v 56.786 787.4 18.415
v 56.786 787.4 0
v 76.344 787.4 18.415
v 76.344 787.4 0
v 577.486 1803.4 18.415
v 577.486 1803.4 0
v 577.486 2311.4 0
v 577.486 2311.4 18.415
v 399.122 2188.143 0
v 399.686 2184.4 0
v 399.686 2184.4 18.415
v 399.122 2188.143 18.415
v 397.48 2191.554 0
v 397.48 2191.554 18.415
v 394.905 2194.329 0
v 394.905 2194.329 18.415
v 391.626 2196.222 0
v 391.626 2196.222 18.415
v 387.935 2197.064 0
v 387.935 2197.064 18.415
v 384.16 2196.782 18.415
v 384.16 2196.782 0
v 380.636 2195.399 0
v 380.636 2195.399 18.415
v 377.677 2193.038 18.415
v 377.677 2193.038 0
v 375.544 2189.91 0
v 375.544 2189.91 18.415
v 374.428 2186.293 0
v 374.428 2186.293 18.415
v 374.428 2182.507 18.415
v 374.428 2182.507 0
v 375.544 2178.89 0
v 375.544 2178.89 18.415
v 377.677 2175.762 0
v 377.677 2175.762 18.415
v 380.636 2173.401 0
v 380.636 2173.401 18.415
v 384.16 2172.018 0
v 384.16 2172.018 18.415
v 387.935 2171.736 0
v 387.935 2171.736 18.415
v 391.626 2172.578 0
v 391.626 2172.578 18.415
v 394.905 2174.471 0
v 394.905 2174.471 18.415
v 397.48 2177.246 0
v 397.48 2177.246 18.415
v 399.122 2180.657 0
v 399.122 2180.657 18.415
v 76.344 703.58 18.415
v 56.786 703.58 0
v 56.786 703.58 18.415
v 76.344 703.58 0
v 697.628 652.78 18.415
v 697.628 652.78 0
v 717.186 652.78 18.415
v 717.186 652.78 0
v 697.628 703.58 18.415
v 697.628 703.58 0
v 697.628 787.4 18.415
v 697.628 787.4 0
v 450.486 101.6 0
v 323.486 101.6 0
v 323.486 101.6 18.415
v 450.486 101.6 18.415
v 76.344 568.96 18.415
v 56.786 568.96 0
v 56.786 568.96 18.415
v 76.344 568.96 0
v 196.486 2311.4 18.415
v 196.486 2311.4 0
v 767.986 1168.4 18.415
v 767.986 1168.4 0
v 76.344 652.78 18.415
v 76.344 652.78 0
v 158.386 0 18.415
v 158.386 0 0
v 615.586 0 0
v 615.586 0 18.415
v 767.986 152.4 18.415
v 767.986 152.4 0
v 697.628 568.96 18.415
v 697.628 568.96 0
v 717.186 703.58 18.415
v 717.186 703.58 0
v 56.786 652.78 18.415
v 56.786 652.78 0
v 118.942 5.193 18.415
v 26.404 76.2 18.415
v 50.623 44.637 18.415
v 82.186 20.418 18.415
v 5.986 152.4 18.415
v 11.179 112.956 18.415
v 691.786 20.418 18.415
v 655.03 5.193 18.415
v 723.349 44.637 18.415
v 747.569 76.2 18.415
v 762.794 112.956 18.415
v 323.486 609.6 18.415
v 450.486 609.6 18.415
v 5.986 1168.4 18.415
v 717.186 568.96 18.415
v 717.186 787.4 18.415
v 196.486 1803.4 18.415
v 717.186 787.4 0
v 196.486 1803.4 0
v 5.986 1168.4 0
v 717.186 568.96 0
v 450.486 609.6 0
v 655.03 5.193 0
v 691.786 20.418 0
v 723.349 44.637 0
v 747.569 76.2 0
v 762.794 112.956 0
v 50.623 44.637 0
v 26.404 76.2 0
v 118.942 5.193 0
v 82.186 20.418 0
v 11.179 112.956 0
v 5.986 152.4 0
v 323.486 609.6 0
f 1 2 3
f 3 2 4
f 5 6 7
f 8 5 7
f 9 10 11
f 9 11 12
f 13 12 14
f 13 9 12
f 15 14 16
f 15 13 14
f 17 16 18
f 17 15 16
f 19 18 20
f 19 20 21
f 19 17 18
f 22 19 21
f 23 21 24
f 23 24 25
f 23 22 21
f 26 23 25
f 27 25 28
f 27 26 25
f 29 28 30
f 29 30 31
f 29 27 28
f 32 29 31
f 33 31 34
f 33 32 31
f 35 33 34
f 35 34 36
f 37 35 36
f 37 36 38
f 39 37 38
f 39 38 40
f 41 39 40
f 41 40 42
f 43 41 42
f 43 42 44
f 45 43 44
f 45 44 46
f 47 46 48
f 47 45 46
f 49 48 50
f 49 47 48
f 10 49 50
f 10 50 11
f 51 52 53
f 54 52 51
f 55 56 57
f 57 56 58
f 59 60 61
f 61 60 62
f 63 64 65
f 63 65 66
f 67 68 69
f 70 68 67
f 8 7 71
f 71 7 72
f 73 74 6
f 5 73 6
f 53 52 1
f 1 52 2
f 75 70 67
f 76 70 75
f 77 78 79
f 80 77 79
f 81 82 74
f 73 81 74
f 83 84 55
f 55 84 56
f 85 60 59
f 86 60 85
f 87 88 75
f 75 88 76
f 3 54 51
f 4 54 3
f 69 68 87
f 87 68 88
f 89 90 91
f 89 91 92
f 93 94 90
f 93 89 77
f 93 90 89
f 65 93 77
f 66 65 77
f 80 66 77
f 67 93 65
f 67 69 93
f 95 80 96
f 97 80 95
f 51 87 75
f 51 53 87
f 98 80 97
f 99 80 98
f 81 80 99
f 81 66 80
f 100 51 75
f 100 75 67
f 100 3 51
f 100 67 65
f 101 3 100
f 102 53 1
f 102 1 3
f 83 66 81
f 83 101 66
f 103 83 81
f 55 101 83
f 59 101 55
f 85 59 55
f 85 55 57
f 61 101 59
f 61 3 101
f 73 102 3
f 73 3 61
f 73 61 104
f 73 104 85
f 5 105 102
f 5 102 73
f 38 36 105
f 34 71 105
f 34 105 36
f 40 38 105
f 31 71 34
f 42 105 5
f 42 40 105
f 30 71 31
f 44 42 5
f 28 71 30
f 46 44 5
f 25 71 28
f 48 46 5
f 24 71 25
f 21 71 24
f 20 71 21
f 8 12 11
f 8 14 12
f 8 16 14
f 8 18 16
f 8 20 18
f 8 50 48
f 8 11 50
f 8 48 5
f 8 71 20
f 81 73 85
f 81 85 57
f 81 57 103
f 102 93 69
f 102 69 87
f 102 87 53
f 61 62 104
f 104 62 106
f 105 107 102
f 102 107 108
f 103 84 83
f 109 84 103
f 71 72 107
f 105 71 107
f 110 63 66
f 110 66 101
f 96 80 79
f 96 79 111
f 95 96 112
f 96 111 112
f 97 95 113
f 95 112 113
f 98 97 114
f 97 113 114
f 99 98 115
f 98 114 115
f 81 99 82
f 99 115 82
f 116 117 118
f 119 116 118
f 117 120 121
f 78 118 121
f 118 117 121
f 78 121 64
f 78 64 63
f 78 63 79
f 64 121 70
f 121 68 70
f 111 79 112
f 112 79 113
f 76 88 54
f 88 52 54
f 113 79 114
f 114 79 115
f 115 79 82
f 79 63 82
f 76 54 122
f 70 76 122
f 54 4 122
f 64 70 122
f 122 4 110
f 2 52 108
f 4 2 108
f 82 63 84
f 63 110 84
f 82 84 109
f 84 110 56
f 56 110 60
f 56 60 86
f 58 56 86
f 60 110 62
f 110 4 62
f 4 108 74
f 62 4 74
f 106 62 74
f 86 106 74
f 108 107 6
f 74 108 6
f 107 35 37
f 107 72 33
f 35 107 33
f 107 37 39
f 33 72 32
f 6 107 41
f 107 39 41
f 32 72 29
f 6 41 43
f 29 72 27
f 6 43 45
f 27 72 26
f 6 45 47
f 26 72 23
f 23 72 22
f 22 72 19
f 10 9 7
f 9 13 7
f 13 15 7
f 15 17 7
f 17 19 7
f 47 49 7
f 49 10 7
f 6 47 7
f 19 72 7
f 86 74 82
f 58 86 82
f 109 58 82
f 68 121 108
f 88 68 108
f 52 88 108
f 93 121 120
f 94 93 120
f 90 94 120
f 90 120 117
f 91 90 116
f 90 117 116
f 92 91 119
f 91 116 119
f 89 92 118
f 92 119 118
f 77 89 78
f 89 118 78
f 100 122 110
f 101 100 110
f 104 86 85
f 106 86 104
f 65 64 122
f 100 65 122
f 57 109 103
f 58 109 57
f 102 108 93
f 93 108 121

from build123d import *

# Parameters (mm, degrees)
F0_W     = 127
F0_H     = 508
F0_W_2   = 19.558
F0_H_2   = 83.82
F0_R     = 12.7
F1_DEPTH = 18.415


with BuildPart() as f1:
    # F0 (on Top) → F1 (new body)
    with BuildSketch(Plane.XY):
        with BuildLine():
            ThreePointArc((5.986409, 152.4), (50.623336, 44.636927), (158.386409, 0))
            Line((158.386409, 0), (615.586409, 0))
            ThreePointArc((615.586409, 0), (723.349482, 44.636927), (767.986409, 152.4))
            Line((767.986409, 152.4), (767.986409, 1168.4))
            Line((767.986409, 1168.4), (577.486409, 1803.4))
            Line((577.486409, 1803.4), (577.486409, 2311.4))
            Line((577.486409, 2311.4), (196.486409, 2311.4))
            Line((196.486409, 2311.4), (196.486409, 1803.4))
            Line((196.486409, 1803.4), (5.986409, 1168.4))
            Line((5.986409, 1168.4), (5.986409, 152.4))
        make_face()
        with Locations((386.986409, 355.6)):
            Rectangle(F0_W, F0_H, mode=Mode.SUBTRACT)
        with Locations((66.565409, 610.87)):
            Rectangle(F0_W_2, F0_H_2, mode=Mode.SUBTRACT)
        with Locations((66.565409, 745.49)):
            Rectangle(F0_W_2, F0_H_2, mode=Mode.SUBTRACT)
        with Locations((707.407409, 610.87)):
            Rectangle(F0_W_2, F0_H_2, mode=Mode.SUBTRACT)
        with Locations((707.407409, 745.49)):
            Rectangle(F0_W_2, F0_H_2, mode=Mode.SUBTRACT)
        with Locations((386.986409, 2184.4)):
            Circle(F0_R, mode=Mode.SUBTRACT)
    extrude(amount=F1_DEPTH)


solid = f1.part
